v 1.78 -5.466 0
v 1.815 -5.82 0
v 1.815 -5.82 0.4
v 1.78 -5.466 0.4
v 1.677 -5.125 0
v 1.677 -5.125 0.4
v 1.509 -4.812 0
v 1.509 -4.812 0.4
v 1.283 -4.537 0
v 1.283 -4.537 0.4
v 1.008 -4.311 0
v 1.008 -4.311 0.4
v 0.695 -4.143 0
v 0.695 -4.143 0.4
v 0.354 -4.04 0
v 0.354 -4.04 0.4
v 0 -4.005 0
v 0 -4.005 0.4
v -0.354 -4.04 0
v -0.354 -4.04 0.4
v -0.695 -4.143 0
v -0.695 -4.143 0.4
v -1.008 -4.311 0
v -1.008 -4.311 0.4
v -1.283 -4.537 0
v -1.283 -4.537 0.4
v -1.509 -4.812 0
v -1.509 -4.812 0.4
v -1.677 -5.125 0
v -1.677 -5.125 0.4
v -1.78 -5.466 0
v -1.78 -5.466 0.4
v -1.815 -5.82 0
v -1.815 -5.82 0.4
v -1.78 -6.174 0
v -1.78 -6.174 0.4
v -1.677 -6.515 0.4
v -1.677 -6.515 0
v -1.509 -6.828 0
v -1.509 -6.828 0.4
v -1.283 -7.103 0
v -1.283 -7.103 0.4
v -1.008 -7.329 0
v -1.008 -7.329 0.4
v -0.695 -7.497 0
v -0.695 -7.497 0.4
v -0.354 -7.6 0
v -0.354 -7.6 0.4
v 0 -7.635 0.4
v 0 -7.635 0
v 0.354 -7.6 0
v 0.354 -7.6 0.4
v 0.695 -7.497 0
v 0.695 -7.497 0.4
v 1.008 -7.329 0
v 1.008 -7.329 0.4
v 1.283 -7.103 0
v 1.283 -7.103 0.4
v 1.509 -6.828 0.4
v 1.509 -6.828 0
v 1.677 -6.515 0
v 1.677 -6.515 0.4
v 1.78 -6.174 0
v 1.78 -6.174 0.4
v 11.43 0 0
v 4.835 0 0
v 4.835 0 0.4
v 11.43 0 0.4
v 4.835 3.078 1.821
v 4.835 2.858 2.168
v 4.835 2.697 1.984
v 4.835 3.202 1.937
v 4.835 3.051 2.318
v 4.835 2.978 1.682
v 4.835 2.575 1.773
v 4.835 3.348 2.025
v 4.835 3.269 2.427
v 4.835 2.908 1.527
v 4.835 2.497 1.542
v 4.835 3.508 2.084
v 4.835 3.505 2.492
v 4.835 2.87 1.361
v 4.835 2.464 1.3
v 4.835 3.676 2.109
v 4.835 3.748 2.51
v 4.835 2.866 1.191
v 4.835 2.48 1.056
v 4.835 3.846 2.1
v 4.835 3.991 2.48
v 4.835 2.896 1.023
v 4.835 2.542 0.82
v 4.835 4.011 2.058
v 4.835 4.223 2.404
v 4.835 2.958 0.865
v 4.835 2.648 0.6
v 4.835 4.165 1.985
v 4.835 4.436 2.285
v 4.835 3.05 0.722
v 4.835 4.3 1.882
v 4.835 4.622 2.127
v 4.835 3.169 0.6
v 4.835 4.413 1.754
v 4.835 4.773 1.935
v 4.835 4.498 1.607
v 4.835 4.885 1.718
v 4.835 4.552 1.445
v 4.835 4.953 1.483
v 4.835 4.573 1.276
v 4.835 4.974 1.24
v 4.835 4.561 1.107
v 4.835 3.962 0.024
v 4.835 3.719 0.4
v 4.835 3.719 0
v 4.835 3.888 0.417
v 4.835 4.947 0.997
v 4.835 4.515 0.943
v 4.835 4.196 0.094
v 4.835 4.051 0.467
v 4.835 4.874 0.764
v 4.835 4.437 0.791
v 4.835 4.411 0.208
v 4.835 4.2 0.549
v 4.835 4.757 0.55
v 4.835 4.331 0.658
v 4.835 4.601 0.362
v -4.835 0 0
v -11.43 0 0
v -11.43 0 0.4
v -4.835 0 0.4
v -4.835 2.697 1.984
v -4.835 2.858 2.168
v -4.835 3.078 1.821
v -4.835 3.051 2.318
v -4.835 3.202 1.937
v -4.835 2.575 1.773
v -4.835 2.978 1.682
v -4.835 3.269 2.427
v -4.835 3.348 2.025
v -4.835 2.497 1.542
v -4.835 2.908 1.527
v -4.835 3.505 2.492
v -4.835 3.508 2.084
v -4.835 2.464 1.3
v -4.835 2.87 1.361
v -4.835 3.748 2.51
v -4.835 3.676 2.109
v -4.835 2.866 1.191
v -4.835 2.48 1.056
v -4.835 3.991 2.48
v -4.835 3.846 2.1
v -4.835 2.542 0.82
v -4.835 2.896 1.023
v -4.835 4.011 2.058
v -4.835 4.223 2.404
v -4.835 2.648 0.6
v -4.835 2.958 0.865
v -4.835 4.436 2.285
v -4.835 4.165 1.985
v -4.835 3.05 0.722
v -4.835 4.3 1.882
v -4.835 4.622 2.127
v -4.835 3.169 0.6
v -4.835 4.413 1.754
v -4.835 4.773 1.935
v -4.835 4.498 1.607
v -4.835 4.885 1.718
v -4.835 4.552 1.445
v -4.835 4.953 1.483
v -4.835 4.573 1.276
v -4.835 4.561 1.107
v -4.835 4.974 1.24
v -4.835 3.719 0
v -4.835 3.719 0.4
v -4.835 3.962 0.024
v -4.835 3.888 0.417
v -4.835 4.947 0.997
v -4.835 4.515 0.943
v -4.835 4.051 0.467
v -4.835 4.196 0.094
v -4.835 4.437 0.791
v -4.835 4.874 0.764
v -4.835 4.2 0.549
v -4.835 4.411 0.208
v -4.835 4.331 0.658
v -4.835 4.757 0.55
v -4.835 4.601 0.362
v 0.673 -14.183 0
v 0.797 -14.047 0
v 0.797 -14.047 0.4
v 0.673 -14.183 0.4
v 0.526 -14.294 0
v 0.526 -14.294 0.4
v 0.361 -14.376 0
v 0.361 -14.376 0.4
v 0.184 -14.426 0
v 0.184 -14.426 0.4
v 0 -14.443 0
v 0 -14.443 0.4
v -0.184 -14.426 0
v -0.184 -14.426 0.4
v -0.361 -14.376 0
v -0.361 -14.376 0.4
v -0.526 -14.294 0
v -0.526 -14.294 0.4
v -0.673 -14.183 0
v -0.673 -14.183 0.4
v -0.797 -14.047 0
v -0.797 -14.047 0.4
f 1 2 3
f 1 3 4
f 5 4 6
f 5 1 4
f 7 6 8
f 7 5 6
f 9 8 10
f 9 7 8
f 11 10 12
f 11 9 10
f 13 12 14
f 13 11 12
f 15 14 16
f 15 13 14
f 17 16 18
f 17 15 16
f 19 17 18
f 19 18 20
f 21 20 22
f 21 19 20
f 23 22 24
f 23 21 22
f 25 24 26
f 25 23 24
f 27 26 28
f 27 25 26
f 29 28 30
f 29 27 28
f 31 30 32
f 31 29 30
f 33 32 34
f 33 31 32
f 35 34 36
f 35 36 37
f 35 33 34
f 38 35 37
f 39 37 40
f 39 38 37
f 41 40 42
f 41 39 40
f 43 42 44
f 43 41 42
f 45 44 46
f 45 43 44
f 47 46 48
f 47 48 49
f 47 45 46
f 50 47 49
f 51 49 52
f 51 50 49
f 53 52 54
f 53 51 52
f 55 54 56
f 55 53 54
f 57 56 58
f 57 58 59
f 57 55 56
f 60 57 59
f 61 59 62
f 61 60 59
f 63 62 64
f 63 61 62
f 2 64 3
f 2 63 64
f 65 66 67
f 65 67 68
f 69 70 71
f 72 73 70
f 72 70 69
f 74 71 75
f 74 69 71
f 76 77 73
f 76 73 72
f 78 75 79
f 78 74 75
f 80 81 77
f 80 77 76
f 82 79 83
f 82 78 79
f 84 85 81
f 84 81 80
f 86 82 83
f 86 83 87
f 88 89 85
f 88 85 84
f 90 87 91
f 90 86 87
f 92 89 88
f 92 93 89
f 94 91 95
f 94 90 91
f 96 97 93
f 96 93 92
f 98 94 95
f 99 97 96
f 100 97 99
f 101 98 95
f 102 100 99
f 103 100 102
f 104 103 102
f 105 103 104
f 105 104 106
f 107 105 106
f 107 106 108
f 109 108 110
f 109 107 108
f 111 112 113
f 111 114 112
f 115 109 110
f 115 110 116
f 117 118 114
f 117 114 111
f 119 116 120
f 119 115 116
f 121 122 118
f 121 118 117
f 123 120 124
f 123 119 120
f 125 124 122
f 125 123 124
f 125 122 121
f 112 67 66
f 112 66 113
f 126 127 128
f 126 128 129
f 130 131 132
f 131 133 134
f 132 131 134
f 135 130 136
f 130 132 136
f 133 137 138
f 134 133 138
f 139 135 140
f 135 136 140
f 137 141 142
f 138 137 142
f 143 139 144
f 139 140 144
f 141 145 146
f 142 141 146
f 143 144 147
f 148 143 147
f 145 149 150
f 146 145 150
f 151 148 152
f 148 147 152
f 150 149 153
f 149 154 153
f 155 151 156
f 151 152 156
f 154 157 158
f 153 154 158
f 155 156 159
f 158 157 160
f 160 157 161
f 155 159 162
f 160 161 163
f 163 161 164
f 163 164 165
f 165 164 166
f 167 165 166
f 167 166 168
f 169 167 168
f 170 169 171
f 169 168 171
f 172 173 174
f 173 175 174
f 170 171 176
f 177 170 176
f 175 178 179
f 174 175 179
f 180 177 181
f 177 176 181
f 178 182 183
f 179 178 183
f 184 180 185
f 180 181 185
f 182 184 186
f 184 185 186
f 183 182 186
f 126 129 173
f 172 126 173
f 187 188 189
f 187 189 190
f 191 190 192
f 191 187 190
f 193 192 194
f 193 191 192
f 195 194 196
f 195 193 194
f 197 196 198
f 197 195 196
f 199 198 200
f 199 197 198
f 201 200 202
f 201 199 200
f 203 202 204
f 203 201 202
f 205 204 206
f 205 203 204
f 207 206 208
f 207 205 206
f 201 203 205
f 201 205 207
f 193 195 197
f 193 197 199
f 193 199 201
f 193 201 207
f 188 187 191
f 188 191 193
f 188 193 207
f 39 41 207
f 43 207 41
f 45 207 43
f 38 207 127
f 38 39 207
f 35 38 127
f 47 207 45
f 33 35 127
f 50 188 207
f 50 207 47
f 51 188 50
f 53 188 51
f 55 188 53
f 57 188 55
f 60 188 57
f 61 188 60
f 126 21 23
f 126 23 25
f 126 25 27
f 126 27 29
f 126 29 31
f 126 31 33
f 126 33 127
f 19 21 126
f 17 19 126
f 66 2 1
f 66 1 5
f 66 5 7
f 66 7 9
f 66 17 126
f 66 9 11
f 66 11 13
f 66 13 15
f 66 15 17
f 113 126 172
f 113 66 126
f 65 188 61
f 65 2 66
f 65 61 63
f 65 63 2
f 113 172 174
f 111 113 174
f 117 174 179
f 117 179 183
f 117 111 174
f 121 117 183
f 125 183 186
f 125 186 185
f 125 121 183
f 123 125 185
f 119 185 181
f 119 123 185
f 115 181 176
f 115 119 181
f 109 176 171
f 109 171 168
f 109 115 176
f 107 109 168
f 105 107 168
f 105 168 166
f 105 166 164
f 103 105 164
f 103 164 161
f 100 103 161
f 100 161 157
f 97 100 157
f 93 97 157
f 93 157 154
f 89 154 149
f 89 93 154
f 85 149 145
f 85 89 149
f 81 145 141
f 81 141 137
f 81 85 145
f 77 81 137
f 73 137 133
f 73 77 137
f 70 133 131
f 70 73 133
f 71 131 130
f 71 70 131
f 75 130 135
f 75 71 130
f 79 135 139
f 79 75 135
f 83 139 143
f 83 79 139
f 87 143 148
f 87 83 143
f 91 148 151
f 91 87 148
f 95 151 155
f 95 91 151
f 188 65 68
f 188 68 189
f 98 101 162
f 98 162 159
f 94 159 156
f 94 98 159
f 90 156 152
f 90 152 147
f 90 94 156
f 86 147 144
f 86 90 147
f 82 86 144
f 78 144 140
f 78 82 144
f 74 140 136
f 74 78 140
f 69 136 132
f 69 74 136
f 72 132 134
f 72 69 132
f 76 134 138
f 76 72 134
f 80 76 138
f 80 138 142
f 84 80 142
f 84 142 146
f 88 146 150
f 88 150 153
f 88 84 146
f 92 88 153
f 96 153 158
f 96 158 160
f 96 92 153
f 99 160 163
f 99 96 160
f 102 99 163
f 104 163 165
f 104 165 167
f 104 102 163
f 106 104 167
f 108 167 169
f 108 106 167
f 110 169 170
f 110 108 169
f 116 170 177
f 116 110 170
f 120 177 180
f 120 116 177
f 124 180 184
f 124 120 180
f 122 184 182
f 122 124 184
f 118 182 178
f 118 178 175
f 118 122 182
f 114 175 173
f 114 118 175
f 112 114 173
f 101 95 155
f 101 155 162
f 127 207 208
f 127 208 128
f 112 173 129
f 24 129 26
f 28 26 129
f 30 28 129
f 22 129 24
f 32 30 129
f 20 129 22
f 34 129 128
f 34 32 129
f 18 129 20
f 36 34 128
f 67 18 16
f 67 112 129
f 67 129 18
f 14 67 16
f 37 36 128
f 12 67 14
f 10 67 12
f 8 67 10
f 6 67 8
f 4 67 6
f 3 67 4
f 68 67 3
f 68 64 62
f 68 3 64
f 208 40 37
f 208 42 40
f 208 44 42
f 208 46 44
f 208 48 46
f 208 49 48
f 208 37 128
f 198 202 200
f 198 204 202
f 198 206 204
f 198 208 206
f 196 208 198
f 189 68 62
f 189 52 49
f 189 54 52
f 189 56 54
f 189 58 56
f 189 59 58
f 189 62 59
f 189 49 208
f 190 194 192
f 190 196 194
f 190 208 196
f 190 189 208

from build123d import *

# Parameters (mm, degrees)
SKETCH1_R                = 1.815
BOSS_EXTRUDE1_DEPTH      = 0.4
BOSS_EXTRUDE2_DEPTH      = 4.835
BOSS_EXTRUDE2_DEPTH_BACK = 4.835


with BuildPart() as part:
    # Sketch1 → Boss-Extrude1 (new body)
    with BuildSketch(Plane.XY):
        with BuildLine():
            Line((-11.43, 0), (11.43, 0))
            Line((11.43, 0), (0.797330841, -14.046658294))
            ThreePointArc((0.797330841, -14.046658294), (0, -14.44311581), (-0.797330841, -14.046658294))
            Line((-0.797330841, -14.046658294), (-11.43, 0))
        make_face()
        with Locations((0, -5.82)):
            Circle(SKETCH1_R, mode=Mode.SUBTRACT)
    extrude(amount=BOSS_EXTRUDE1_DEPTH)

    # Sketch3 → Boss-Extrude2 (add, two sides: drawn at the far end of the back side and taken through both)
    with BuildSketch(Plane(origin=(0, 0, 0), x_dir=(0, 0, -1), z_dir=(1, 0, 0)).offset(-BOSS_EXTRUDE2_DEPTH_BACK)):
        with BuildLine():
            Line((-0.4, 0), (0, 0))
            Line((0, 0), (0, 3.718694726))
            ThreePointArc((0, 3.718694726), (-2.349771666, 4.332290684), (-0.6, 2.648180831))
            Line((-0.6, 2.648180831), (-0.6, 3.16914946))
            ThreePointArc((-0.6, 3.16914946), (-2.058445704, 4.011098557), (-0.4, 3.718694726))
            Line((-0.4, 3.718694726), (-0.4, 0))
        make_face()
    extrude(amount=BOSS_EXTRUDE2_DEPTH + BOSS_EXTRUDE2_DEPTH_BACK)


solid = part.part
